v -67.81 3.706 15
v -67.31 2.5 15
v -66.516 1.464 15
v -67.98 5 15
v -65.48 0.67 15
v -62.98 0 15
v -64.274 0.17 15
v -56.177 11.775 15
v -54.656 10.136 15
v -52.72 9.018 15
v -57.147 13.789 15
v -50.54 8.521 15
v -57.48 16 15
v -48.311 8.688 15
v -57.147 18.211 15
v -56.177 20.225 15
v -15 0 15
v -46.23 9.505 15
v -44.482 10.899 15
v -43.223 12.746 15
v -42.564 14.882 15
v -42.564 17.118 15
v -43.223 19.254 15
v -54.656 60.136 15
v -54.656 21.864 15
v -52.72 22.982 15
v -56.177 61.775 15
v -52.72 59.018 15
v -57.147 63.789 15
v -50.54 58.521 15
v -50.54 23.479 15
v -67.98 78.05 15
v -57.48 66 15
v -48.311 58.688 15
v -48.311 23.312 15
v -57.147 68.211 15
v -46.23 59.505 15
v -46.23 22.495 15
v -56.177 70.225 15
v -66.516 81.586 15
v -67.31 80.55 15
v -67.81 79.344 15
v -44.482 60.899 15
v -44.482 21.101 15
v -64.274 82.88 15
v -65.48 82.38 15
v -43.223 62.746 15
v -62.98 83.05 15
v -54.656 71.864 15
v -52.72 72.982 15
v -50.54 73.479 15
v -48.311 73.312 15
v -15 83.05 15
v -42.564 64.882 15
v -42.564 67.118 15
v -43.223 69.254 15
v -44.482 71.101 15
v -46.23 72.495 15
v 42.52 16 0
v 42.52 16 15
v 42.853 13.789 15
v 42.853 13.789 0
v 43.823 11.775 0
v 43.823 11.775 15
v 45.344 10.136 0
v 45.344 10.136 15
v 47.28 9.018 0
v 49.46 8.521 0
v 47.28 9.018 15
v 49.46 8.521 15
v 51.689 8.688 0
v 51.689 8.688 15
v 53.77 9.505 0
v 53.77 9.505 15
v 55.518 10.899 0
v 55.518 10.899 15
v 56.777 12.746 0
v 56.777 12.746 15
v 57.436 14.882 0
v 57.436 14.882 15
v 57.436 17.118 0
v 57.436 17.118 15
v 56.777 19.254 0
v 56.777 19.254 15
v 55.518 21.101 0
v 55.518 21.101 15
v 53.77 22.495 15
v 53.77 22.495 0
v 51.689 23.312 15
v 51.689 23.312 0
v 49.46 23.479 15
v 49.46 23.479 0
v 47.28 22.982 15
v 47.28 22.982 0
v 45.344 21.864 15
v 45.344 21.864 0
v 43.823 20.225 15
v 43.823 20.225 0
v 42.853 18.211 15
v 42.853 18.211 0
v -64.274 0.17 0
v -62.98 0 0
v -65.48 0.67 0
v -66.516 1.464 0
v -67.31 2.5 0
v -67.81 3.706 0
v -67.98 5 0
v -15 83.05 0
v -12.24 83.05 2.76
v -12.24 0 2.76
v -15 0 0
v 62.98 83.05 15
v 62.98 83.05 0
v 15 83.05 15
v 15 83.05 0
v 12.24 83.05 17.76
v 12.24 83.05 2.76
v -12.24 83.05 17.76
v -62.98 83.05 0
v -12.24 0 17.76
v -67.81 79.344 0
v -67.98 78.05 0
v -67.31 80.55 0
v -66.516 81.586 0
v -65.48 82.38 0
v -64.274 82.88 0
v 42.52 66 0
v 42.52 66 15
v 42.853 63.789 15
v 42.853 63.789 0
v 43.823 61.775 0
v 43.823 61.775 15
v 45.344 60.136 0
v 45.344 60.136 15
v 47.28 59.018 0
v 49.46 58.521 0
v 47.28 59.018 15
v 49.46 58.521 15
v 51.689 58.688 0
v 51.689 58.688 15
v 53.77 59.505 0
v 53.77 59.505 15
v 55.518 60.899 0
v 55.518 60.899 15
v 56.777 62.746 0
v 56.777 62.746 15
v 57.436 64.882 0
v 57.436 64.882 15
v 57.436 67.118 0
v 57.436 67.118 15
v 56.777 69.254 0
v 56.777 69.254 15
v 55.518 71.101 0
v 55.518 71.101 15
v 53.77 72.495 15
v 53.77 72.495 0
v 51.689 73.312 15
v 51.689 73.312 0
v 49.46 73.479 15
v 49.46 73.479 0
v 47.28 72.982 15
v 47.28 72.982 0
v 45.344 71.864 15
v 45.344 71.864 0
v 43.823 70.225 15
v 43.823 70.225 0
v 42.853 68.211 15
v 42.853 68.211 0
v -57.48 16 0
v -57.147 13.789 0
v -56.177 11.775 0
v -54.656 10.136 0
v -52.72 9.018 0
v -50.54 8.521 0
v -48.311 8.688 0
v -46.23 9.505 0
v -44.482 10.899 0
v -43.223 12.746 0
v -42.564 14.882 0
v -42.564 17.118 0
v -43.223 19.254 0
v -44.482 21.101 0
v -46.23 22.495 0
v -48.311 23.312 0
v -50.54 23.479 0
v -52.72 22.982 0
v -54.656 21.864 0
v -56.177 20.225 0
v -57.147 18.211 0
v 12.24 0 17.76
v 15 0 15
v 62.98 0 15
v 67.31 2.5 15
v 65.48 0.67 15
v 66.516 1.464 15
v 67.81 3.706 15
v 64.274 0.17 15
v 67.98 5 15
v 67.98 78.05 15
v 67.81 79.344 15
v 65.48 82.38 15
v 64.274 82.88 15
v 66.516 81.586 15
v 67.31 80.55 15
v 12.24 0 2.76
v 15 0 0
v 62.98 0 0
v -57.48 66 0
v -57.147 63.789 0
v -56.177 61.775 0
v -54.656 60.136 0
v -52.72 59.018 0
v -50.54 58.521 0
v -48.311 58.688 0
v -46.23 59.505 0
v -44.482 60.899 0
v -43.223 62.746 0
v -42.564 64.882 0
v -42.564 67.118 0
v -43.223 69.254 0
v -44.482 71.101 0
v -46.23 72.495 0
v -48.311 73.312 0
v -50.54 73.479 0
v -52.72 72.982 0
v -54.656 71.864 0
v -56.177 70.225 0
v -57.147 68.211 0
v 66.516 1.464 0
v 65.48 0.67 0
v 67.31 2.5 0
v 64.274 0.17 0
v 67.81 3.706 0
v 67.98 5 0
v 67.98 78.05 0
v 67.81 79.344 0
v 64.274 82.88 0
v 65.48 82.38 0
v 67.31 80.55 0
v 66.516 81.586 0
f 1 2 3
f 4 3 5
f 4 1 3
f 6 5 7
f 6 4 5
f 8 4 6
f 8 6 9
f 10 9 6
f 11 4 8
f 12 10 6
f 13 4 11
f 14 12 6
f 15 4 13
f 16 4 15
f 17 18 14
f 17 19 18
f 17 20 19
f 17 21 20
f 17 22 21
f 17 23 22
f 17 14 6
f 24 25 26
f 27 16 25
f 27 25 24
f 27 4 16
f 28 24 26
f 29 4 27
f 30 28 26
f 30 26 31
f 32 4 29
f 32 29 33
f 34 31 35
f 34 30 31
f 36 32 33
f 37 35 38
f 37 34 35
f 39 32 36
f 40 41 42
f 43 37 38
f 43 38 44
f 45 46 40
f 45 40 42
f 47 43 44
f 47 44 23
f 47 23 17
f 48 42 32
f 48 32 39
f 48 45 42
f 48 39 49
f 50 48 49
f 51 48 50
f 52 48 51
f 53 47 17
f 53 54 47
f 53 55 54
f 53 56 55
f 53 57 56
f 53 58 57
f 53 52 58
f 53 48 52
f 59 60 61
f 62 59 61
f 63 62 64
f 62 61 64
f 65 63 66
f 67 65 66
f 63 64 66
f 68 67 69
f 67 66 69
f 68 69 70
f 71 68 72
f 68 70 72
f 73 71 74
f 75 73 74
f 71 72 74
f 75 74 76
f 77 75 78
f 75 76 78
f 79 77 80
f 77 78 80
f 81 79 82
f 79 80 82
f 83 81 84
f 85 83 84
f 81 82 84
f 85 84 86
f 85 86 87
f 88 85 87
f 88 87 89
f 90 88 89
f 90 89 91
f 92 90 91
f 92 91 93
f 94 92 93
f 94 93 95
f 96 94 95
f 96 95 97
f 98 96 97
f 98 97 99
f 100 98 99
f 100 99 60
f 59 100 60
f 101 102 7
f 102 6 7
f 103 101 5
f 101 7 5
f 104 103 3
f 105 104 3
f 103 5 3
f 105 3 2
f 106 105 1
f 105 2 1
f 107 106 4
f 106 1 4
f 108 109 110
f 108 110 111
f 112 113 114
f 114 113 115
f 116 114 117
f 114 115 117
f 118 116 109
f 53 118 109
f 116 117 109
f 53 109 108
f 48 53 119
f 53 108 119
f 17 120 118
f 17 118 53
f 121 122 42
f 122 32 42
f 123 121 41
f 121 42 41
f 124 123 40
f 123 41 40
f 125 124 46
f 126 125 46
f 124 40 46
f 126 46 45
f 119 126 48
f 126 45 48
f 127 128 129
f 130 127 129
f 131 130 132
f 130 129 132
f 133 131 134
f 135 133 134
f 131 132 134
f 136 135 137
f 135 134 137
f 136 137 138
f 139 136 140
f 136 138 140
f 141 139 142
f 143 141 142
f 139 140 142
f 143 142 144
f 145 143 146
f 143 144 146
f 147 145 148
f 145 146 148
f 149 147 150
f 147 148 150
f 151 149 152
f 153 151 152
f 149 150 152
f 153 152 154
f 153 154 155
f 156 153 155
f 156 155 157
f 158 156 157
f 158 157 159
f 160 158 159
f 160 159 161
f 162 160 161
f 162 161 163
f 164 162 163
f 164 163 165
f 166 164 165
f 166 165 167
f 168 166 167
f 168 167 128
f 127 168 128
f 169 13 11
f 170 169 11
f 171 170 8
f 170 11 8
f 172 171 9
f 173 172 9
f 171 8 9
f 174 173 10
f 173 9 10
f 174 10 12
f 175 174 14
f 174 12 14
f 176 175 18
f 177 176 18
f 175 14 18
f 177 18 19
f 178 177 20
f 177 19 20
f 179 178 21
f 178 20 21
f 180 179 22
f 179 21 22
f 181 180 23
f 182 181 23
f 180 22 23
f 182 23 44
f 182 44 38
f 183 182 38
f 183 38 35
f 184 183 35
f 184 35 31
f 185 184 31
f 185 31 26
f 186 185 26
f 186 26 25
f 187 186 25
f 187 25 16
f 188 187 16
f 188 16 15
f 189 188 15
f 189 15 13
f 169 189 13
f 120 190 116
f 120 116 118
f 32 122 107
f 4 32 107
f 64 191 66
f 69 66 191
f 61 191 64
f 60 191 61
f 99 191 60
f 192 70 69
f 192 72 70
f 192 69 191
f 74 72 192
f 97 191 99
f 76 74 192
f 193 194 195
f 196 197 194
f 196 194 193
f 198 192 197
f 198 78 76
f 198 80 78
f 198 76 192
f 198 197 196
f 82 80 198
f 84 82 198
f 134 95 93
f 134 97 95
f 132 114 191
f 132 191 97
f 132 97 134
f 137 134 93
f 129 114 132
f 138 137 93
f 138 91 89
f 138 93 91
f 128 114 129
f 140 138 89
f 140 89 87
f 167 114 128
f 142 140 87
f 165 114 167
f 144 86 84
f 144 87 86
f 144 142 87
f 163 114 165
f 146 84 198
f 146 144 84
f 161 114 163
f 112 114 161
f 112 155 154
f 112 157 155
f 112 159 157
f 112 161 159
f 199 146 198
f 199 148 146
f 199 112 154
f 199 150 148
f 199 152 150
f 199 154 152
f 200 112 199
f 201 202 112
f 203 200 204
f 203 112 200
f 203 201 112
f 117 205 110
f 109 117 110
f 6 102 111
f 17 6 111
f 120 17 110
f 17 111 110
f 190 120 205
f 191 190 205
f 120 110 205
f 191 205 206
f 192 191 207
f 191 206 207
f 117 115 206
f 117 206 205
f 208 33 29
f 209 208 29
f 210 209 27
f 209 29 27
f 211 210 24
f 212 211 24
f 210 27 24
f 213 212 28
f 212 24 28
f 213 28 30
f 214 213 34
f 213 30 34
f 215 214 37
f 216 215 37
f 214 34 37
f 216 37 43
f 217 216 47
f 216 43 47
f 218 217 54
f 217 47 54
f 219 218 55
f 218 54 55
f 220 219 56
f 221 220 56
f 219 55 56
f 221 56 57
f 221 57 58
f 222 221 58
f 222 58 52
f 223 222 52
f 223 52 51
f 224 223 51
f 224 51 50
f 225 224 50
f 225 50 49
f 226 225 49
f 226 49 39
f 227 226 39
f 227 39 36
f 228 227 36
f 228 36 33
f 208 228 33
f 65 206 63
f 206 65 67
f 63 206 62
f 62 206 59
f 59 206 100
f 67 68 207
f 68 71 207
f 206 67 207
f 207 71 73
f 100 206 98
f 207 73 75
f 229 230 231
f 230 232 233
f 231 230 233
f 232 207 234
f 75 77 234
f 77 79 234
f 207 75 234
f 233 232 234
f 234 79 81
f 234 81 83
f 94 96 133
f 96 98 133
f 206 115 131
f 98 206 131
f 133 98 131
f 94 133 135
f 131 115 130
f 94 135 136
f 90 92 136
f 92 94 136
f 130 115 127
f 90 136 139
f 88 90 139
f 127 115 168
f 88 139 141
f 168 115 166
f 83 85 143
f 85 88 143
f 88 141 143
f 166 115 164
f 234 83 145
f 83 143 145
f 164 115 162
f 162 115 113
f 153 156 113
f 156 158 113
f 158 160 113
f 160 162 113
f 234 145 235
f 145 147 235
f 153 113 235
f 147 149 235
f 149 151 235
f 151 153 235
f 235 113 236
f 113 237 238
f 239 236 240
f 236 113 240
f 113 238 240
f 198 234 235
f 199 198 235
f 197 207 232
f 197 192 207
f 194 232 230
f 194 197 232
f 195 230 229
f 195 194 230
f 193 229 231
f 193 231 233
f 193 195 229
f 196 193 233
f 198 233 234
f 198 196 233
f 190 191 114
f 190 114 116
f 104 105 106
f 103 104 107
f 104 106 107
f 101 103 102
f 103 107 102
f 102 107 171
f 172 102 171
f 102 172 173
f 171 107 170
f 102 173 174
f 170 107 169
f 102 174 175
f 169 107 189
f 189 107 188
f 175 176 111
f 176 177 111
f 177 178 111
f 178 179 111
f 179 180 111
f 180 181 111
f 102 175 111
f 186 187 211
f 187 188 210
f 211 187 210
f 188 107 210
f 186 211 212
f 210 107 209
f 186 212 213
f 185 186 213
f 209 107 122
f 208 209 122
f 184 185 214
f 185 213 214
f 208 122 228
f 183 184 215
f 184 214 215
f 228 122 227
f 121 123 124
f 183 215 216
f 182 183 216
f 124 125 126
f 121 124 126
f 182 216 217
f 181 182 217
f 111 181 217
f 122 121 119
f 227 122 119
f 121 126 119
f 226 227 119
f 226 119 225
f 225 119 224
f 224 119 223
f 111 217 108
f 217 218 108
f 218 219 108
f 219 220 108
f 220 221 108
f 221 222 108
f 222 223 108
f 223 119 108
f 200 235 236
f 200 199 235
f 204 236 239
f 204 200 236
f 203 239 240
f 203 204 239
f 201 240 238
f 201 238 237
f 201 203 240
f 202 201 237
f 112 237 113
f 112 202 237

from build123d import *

# Parameters (mm, degrees)
F1_DEPTH = 15
F4_DEPTH = 83.051
F7_DEPTH = 83.05
F8_R     = 5
F10_D    = 15


with BuildPart() as f1:
    # F0 (on Top) → F1 (new body)
    with BuildSketch(Plane.XY):
        Polygon((-67.98, 0), (0, 0), (67.98, 0), (67.98, 83.05), (-67.98, 83.05), align=None)
    extrude(amount=F1_DEPTH)

    # F3 (on offset) → F4 (cut, through all)
    with BuildSketch(Plane.XZ):
        Polygon((-15, 0), (0, 0), (15, 0), (12.24, 2.76), (-12.24, 2.76), align=None)
    extrude(amount=-F4_DEPTH, mode=Mode.SUBTRACT)

    # F6 (on offset) → F7 (join)
    with BuildSketch(Plane.XZ):
        Polygon((-15, 15), (0, 15), (15, 15), (12.24, 17.76), (-12.24, 17.76), align=None)
    extrude(amount=-F7_DEPTH)

    # F8
    f8_edges = [f1.edges().sort_by_distance(p)[0] for p in [
        (-67.98, 0, 7.5),
        (67.98, 0, 7.5),
        (67.98, 83.05, 7.5),
        (-67.98, 83.05, 7.5),
    ]]
    fillet(f8_edges, radius=F8_R)

    # F10 (through all)
    with Locations(Plane(origin=(0, 0, 0), x_dir=(1, 0, 0), z_dir=(0, 0, -1))):
        with Locations((-49.98, -66), (-49.98, -16), (50.02, -66), (50.02, -16)):
            Hole(F10_D / 2)


solid = f1.part
